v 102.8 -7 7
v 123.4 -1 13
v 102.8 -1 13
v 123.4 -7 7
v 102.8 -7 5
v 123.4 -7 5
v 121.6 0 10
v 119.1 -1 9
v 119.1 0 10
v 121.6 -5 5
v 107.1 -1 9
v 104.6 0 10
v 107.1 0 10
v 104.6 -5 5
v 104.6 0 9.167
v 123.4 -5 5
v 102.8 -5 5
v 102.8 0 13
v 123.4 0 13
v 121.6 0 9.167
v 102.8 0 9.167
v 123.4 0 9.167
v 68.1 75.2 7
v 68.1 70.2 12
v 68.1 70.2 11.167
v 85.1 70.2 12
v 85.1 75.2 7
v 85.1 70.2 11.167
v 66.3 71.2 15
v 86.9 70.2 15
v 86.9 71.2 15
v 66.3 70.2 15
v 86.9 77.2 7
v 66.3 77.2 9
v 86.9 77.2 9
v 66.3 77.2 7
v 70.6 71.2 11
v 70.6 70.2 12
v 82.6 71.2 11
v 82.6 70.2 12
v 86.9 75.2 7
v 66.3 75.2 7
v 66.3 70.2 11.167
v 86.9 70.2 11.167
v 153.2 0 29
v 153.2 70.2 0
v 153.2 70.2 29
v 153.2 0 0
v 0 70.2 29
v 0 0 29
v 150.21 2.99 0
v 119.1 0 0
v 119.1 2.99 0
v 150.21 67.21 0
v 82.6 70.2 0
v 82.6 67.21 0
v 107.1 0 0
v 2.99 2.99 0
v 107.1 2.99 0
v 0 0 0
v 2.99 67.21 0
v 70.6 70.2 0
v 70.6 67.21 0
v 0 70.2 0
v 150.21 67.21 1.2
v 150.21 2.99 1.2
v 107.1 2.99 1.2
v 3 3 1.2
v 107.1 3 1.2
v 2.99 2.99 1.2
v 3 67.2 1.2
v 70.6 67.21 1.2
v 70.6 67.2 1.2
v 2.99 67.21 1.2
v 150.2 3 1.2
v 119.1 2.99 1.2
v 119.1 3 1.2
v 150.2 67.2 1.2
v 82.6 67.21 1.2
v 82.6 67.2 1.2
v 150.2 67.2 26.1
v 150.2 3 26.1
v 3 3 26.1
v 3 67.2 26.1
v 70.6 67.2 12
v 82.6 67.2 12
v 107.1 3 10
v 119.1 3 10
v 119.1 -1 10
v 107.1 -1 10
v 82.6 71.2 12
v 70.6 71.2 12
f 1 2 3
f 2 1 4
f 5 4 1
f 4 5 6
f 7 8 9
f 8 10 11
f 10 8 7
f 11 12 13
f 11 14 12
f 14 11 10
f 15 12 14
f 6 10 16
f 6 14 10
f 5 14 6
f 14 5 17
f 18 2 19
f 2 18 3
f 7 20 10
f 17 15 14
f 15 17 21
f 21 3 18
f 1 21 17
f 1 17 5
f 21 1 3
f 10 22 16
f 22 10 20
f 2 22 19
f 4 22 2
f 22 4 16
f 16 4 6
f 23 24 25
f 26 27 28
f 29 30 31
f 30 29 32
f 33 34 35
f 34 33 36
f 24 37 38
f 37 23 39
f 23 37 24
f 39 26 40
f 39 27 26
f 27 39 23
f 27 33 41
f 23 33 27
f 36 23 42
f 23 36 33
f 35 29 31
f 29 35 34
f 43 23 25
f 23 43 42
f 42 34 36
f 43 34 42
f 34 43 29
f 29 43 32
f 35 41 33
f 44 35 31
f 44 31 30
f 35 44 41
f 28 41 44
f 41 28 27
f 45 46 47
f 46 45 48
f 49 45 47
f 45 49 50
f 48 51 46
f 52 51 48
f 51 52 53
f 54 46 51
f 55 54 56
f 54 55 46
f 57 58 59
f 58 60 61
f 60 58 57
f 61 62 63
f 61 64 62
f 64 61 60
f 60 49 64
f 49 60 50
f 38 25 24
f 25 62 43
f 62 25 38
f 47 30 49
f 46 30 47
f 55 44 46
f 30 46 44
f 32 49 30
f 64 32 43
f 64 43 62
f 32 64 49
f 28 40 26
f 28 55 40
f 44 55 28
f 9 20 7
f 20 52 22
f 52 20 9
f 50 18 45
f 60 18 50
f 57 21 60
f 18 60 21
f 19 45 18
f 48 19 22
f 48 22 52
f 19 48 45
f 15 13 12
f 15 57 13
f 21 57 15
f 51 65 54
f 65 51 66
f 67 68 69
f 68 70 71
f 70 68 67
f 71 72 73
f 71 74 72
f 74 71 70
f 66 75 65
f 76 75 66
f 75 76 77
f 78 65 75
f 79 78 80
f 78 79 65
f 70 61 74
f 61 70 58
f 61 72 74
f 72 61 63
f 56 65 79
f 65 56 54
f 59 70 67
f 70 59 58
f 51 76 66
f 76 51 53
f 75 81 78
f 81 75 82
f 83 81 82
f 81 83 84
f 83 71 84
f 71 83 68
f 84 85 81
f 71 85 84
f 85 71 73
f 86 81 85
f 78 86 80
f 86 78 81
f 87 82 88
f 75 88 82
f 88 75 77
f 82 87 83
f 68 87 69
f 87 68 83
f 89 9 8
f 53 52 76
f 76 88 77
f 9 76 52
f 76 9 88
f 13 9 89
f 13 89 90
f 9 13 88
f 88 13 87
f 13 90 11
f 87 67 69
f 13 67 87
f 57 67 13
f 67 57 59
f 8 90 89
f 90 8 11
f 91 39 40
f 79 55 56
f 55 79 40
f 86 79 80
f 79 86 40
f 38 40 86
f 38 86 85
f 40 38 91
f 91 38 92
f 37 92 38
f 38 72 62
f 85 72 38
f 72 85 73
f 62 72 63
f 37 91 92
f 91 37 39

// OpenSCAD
// OpenSCAD 2021.01 compatible
// Cover for the relay-board extension plate
//
// Features:
// - primary slit with rain roof on one long wall
// - secondary control-cable slit on the opposing +Y wall
// - secondary slit centered in the housing along X
// - rain roof added for BOTH slits
// - OpenSCAD 2021.01 safe variable ordering

$fn = 64;

// -----------------------------
// Matching plate parameters
// -----------------------------
pcb_width      = 136.0;  // mm
pcb_depth      = 53.0;   // mm
pcb_margin     = 5.0;    // mm border around PCB on the plate

// -----------------------------
// Cover parameters
// -----------------------------
fit_clearance      = 0.6;   // mm clearance around rim outer size
wall_thickness     = 3.0;   // mm side wall thickness
top_thickness      = 3.0;   // mm top thickness
inside_height      = 26.0;  // mm inside height from bottom edge to underside of top

// Primary cable slit in long side wall
slot_side          = "front"; // "front" or "back"
slot_x             = (pcb_width + 2 * pcb_margin) * 0.75; // position relative to INNER rim size
slot_width         = 12.0;   // mm opening width along X
slot_top_z         = 10.0;   // slit is open from z=0 to this height

// Secondary slit on the OPPOSING long wall, centered in the housing
control_slot_enabled = true;
control_slot_width   = 12.0;  // mm opening width along X
control_slot_top_z   = 12.0;  // open from z=0 to this height

// Rain roof above both slits
roof_clearance       = 1.0;    // gap from slit top to roof underside
roof_projection      = 6.0;    // how far roof sticks out
roof_drop            = 6.0;    // how much outer edge drops
roof_thickness       = 2.0;    // roof material thickness
roof_side_margin     = 2.5;    // extra width beyond slit
roof_cheek_thickness = 1.8;    // side cheek thickness

// Optional small overhang lip near the bottom for a cleaner look
bottom_chamfer_h   = 1.2;   // mm
bottom_chamfer_in  = 0.8;   // mm

// -----------------------------
// Derived dimensions
// -----------------------------
rim_outer_width = pcb_width + 2 * pcb_margin;
rim_outer_depth = pcb_depth + 2 * pcb_margin;

inner_width  = rim_outer_width + 2 * fit_clearance;
inner_depth  = rim_outer_depth + 2 * fit_clearance;
outer_width  = inner_width + 2 * wall_thickness;
outer_depth  = inner_depth + 2 * wall_thickness;
outer_height = inside_height + top_thickness;

// Primary slot position measured from OUTER left edge
slot_center_x = wall_thickness + fit_clearance + slot_x;

// Secondary slot centered in the housing along X
control_slot_center_x = outer_width / 2;

// Roof footprint for primary slit
roof1_x0 = slot_center_x - slot_width / 2 - roof_side_margin;
roof1_x1 = slot_center_x + slot_width / 2 + roof_side_margin;
roof1_width = roof1_x1 - roof1_x0;

roof1_back_z  = slot_top_z + roof_clearance;
roof1_front_z = roof1_back_z - roof_drop;

// Roof footprint for control slit
roof2_x0 = control_slot_center_x - control_slot_width / 2 - roof_side_margin;
roof2_x1 = control_slot_center_x + control_slot_width / 2 + roof_side_margin;
roof2_width = roof2_x1 - roof2_x0;

roof2_back_z  = control_slot_top_z + roof_clearance;
roof2_front_z = roof2_back_z - roof_drop;

// -----------------------------
// Geometry
// -----------------------------
module outer_shell() {
    cube([outer_width, outer_depth, outer_height]);
}

module inner_cavity() {
    translate([wall_thickness, wall_thickness, 0])
        cube([inner_width, inner_depth, inside_height + 0.1]);
}

module bottom_softening_cut() {
    if (bottom_chamfer_h > 0 && bottom_chamfer_in > 0) {
        translate([wall_thickness - 0.01, wall_thickness - 0.01, 0])
            difference() {
                cube([inner_width + 0.02, inner_depth + 0.02, bottom_chamfer_h]);
                translate([bottom_chamfer_in, bottom_chamfer_in, -0.01])
                    cube([
                        inner_width - 2 * bottom_chamfer_in + 0.02,
                        inner_depth - 2 * bottom_chamfer_in + 0.02,
                        bottom_chamfer_h + 0.02
                    ]);
            }
    }
}

module cable_slot_cutout_front(center_x, width, top_z) {
    translate([center_x - width / 2, -1, 0])
        cube([width, wall_thickness + 2, top_z]);
}

module cable_slot_cutout_back(center_x, width, top_z) {
    translate([center_x - width / 2, outer_depth - wall_thickness - 1, 0])
        cube([width, wall_thickness + 2, top_z]);
}

// Generic roof on the front wall (y=0 side), sloping outward toward -Y
module rain_roof_front(x0, width, slot_top, back_z, front_z) {
    hull() {
        translate([x0, -roof_thickness / 2, back_z])
            cube([width, roof_thickness, roof_thickness]);

        translate([x0, -roof_projection - roof_thickness / 2, front_z])
            cube([width, roof_thickness, roof_thickness]);
    }
}

module rain_cheek_front_left(x0, slot_top, back_z, front_z) {
    hull() {
        translate([x0 - roof_cheek_thickness, -roof_thickness / 2, slot_top])
            cube([roof_cheek_thickness, roof_thickness, back_z + roof_thickness - slot_top]);

        translate([x0 - roof_cheek_thickness, -roof_projection - roof_thickness / 2, front_z])
            cube([roof_cheek_thickness, roof_thickness, roof_thickness]);
    }
}

module rain_cheek_front_right(x1, slot_top, back_z, front_z) {
    hull() {
        translate([x1, -roof_thickness / 2, slot_top])
            cube([roof_cheek_thickness, roof_thickness, back_z + roof_thickness - slot_top]);

        translate([x1, -roof_projection - roof_thickness / 2, front_z])
            cube([roof_cheek_thickness, roof_thickness, roof_thickness]);
    }
}

// Generic roof on the back wall (+Y side), sloping outward toward +Y
module rain_roof_back(x0, width, slot_top, back_z, front_z) {
    hull() {
        translate([x0, outer_depth - roof_thickness / 2, back_z])
            cube([width, roof_thickness, roof_thickness]);

        translate([x0, outer_depth + roof_projection - roof_thickness / 2, front_z])
            cube([width, roof_thickness, roof_thickness]);
    }
}

module rain_cheek_back_left(x0, slot_top, back_z, front_z) {
    hull() {
        translate([x0 - roof_cheek_thickness, outer_depth - roof_thickness / 2, slot_top])
            cube([roof_cheek_thickness, roof_thickness, back_z + roof_thickness - slot_top]);

        translate([x0 - roof_cheek_thickness, outer_depth + roof_projection - roof_thickness / 2, front_z])
            cube([roof_cheek_thickness, roof_thickness, roof_thickness]);
    }
}

module rain_cheek_back_right(x1, slot_top, back_z, front_z) {
    hull() {
        translate([x1, outer_depth - roof_thickness / 2, slot_top])
            cube([roof_cheek_thickness, roof_thickness, back_z + roof_thickness - slot_top]);

        translate([x1, outer_depth + roof_projection - roof_thickness / 2, front_z])
            cube([roof_cheek_thickness, roof_thickness, roof_thickness]);
    }
}

module primary_roof_and_cheeks() {
    if (slot_side == "front") {
        rain_roof_front(roof1_x0, roof1_width, slot_top_z, roof1_back_z, roof1_front_z);
        rain_cheek_front_left(roof1_x0, slot_top_z, roof1_back_z, roof1_front_z);
        rain_cheek_front_right(roof1_x1, slot_top_z, roof1_back_z, roof1_front_z);
    } else {
        rain_roof_back(roof1_x0, roof1_width, slot_top_z, roof1_back_z, roof1_front_z);
        rain_cheek_back_left(roof1_x0, slot_top_z, roof1_back_z, roof1_front_z);
        rain_cheek_back_right(roof1_x1, slot_top_z, roof1_back_z, roof1_front_z);
    }
}

module control_roof_and_cheeks() {
    if (control_slot_enabled) {
        if (slot_side == "front") {
            // opposing slit is on +Y / back wall
            rain_roof_back(roof2_x0, roof2_width, control_slot_top_z, roof2_back_z, roof2_front_z);
            rain_cheek_back_left(roof2_x0, control_slot_top_z, roof2_back_z, roof2_front_z);
            rain_cheek_back_right(roof2_x1, control_slot_top_z, roof2_back_z, roof2_front_z);
        } else {
            // opposing slit is on front wall
            rain_roof_front(roof2_x0, roof2_width, control_slot_top_z, roof2_back_z, roof2_front_z);
            rain_cheek_front_left(roof2_x0, control_slot_top_z, roof2_back_z, roof2_front_z);
            rain_cheek_front_right(roof2_x1, control_slot_top_z, roof2_back_z, roof2_front_z);
        }
    }
}

module primary_slot_cutout() {
    if (slot_side == "front")
        cable_slot_cutout_front(slot_center_x, slot_width, slot_top_z);
    else
        cable_slot_cutout_back(slot_center_x, slot_width, slot_top_z);
}

module opposing_control_slot_cutout() {
    if (control_slot_enabled) {
        if (slot_side == "front")
            cable_slot_cutout_back(control_slot_center_x, control_slot_width, control_slot_top_z);
        else
            cable_slot_cutout_front(control_slot_center_x, control_slot_width, control_slot_top_z);
    }
}

module relay_cover() {
    difference() {
        union() {
            outer_shell();
            primary_roof_and_cheeks();
            control_roof_and_cheeks();
        }
        inner_cavity();
        bottom_softening_cut();
        primary_slot_cutout();
        opposing_control_slot_cutout();
    }
}

relay_cover();
